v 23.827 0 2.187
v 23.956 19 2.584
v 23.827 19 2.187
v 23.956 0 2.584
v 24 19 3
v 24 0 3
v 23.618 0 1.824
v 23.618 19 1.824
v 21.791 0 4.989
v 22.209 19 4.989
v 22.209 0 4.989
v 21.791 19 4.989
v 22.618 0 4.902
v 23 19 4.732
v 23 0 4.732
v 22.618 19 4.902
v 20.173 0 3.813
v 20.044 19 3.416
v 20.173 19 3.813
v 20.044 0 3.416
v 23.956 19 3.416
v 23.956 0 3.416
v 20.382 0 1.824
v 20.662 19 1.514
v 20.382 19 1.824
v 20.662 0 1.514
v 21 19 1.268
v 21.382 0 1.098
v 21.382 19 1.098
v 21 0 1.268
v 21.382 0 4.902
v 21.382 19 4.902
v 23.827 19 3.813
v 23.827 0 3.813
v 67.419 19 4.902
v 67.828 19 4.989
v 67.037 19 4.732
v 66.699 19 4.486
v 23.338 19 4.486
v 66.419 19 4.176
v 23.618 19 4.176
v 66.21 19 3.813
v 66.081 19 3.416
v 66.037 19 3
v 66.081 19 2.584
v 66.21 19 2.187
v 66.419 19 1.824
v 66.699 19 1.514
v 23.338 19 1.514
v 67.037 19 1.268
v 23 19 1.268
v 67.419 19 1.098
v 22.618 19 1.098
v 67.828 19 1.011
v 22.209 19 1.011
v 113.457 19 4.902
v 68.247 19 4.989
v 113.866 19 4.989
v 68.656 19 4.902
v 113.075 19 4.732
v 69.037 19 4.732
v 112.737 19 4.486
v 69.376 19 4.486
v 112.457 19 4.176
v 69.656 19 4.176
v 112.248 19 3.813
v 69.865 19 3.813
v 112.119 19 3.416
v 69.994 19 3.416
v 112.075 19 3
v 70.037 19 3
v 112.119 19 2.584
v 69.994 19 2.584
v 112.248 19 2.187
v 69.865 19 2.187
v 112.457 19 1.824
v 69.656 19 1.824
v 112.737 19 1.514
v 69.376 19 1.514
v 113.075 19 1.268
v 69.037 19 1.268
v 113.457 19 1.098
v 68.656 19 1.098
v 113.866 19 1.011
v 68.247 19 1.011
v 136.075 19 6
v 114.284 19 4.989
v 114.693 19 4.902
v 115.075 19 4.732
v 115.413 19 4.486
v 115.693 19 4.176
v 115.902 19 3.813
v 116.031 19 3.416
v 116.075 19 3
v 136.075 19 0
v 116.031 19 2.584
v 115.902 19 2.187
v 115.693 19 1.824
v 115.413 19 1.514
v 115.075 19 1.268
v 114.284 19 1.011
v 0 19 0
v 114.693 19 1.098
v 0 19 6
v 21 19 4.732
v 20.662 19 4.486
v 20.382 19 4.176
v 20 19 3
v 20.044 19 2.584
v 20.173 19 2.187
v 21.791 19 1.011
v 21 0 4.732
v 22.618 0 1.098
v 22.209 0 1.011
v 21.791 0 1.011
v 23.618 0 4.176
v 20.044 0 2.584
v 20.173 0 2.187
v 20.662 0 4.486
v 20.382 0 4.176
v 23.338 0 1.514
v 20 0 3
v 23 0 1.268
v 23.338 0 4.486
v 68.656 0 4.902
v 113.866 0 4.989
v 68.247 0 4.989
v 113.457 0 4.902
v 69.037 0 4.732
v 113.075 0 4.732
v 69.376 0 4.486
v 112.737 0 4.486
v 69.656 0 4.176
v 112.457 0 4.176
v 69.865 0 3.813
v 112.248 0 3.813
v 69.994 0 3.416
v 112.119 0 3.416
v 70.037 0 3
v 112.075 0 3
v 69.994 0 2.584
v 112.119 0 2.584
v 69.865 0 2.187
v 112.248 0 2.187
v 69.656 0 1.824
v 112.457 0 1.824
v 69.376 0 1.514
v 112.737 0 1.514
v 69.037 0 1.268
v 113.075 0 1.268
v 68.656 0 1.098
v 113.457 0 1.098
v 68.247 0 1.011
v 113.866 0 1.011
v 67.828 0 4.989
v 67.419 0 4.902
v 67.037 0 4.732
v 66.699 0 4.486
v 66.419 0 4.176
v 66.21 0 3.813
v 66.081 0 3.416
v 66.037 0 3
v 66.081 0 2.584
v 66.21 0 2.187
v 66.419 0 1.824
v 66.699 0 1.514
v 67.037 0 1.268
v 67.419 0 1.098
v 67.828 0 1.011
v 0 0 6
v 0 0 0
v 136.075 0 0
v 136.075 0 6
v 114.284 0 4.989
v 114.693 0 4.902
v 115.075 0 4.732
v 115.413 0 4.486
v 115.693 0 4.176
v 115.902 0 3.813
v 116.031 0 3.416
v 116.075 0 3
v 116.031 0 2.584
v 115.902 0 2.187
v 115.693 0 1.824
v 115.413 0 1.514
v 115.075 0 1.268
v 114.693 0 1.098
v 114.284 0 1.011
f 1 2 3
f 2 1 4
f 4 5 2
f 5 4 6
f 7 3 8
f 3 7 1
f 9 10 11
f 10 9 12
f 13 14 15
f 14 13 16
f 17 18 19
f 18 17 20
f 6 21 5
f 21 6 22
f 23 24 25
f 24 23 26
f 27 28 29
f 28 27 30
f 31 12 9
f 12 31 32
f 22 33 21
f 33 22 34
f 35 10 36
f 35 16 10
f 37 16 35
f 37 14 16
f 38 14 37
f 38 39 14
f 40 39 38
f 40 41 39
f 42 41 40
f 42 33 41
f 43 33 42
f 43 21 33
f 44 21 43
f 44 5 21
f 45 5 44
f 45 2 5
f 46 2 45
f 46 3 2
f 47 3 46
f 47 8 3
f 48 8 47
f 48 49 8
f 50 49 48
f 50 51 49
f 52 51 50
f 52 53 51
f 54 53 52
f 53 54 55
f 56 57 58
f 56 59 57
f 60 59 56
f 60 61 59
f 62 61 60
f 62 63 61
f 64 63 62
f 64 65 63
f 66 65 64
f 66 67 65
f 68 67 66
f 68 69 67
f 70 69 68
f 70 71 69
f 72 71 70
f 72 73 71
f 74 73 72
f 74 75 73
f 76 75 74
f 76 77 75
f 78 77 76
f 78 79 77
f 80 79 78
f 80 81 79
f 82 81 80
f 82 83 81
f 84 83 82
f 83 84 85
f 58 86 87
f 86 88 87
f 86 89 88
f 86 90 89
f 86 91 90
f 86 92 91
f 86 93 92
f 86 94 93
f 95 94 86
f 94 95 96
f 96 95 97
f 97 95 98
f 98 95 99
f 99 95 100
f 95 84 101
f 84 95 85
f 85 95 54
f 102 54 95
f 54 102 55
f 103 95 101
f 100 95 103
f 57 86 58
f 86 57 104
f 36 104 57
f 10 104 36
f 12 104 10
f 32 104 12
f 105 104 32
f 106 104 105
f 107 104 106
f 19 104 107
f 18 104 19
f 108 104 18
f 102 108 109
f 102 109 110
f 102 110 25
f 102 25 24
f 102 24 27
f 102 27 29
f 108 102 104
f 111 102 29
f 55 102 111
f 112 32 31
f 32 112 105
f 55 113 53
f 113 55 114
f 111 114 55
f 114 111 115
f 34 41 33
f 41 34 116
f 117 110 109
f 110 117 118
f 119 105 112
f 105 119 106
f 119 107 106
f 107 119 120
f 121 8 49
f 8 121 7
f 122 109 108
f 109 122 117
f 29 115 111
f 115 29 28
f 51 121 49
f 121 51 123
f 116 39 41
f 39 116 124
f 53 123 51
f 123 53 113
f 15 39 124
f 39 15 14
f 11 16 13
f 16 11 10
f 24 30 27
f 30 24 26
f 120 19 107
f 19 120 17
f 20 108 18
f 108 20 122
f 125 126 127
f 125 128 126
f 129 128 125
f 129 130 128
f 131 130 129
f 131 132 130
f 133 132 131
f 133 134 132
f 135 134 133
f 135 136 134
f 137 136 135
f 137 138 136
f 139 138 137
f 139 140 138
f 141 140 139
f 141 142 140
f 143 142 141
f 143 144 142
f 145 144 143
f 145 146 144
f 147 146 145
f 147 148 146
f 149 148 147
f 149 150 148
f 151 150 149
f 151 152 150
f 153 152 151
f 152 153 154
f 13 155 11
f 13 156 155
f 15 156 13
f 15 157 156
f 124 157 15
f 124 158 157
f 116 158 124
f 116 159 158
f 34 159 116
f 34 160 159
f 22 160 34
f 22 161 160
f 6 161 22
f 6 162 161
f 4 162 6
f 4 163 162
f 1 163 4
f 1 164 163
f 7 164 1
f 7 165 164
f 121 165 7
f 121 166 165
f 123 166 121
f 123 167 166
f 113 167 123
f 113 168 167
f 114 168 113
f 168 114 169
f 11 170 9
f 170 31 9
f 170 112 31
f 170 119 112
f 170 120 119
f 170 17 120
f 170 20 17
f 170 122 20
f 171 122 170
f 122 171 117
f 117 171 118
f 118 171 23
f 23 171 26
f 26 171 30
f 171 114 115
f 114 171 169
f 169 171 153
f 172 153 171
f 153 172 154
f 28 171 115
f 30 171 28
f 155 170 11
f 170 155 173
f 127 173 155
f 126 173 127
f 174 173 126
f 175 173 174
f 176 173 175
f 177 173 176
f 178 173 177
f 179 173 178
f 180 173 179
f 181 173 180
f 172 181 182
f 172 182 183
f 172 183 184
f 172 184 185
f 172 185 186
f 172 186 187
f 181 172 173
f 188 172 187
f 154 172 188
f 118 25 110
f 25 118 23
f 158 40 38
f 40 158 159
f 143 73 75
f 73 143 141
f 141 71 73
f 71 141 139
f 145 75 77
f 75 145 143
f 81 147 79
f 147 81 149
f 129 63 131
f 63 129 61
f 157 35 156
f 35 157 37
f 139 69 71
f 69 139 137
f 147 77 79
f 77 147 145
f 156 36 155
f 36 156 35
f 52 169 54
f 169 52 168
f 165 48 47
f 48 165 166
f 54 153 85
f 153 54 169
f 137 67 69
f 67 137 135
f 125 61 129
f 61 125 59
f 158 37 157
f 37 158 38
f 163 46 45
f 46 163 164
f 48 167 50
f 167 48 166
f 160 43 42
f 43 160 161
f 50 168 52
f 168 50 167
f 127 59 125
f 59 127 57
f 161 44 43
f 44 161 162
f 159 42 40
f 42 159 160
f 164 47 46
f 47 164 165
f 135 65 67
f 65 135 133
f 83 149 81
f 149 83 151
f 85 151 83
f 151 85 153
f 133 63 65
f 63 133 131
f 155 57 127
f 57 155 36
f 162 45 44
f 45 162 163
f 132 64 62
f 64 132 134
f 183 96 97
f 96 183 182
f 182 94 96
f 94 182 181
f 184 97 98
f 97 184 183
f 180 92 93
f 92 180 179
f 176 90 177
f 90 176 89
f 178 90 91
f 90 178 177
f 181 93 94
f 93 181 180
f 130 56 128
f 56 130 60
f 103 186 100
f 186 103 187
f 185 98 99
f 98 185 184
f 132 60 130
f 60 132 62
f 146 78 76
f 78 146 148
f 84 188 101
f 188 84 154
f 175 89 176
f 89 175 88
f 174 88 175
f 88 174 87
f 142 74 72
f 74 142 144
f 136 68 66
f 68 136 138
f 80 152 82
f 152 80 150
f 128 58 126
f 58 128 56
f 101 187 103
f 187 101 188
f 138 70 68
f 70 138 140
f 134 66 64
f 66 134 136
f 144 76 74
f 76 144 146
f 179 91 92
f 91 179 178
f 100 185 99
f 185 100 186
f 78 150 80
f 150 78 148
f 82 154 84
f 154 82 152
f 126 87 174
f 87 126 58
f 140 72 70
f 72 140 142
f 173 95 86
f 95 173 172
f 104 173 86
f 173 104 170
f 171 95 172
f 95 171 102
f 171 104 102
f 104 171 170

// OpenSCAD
/* multi-gang outlet box shim
   Russell Salerno 2017-02-18
*/

// user customizer parameters
// number of gangs in the outlet box
numGangs = 3; 
// depth of the shim you need
shimDepth = 19.0;           

// the rest of these parameters will not ordinarily be changed
gangSpacing = 46.0375;      // spacing between devices in multi-gang boxes
shimHeight = 6.0;           // height of shim
shimWidth = 44.0;           // width of one device
holeOffset = 3.0;           // distance from top of shim to center of hole
holeDia = 4.0;              // fits standard size screw
$fn=30;

module shim() {
    cube([shimWidth+((numGangs-1)*gangSpacing), shimDepth, shimHeight]);
}

module holes() {
    for (i=[0:numGangs-1]) {
        translate([shimWidth/2 + i*gangSpacing, 0, shimHeight-holeOffset]) rotate([270, 0, 0]) cylinder(d=holeDia, h=shimDepth);
    }
}


difference() {
    shim();
    holes();
}
